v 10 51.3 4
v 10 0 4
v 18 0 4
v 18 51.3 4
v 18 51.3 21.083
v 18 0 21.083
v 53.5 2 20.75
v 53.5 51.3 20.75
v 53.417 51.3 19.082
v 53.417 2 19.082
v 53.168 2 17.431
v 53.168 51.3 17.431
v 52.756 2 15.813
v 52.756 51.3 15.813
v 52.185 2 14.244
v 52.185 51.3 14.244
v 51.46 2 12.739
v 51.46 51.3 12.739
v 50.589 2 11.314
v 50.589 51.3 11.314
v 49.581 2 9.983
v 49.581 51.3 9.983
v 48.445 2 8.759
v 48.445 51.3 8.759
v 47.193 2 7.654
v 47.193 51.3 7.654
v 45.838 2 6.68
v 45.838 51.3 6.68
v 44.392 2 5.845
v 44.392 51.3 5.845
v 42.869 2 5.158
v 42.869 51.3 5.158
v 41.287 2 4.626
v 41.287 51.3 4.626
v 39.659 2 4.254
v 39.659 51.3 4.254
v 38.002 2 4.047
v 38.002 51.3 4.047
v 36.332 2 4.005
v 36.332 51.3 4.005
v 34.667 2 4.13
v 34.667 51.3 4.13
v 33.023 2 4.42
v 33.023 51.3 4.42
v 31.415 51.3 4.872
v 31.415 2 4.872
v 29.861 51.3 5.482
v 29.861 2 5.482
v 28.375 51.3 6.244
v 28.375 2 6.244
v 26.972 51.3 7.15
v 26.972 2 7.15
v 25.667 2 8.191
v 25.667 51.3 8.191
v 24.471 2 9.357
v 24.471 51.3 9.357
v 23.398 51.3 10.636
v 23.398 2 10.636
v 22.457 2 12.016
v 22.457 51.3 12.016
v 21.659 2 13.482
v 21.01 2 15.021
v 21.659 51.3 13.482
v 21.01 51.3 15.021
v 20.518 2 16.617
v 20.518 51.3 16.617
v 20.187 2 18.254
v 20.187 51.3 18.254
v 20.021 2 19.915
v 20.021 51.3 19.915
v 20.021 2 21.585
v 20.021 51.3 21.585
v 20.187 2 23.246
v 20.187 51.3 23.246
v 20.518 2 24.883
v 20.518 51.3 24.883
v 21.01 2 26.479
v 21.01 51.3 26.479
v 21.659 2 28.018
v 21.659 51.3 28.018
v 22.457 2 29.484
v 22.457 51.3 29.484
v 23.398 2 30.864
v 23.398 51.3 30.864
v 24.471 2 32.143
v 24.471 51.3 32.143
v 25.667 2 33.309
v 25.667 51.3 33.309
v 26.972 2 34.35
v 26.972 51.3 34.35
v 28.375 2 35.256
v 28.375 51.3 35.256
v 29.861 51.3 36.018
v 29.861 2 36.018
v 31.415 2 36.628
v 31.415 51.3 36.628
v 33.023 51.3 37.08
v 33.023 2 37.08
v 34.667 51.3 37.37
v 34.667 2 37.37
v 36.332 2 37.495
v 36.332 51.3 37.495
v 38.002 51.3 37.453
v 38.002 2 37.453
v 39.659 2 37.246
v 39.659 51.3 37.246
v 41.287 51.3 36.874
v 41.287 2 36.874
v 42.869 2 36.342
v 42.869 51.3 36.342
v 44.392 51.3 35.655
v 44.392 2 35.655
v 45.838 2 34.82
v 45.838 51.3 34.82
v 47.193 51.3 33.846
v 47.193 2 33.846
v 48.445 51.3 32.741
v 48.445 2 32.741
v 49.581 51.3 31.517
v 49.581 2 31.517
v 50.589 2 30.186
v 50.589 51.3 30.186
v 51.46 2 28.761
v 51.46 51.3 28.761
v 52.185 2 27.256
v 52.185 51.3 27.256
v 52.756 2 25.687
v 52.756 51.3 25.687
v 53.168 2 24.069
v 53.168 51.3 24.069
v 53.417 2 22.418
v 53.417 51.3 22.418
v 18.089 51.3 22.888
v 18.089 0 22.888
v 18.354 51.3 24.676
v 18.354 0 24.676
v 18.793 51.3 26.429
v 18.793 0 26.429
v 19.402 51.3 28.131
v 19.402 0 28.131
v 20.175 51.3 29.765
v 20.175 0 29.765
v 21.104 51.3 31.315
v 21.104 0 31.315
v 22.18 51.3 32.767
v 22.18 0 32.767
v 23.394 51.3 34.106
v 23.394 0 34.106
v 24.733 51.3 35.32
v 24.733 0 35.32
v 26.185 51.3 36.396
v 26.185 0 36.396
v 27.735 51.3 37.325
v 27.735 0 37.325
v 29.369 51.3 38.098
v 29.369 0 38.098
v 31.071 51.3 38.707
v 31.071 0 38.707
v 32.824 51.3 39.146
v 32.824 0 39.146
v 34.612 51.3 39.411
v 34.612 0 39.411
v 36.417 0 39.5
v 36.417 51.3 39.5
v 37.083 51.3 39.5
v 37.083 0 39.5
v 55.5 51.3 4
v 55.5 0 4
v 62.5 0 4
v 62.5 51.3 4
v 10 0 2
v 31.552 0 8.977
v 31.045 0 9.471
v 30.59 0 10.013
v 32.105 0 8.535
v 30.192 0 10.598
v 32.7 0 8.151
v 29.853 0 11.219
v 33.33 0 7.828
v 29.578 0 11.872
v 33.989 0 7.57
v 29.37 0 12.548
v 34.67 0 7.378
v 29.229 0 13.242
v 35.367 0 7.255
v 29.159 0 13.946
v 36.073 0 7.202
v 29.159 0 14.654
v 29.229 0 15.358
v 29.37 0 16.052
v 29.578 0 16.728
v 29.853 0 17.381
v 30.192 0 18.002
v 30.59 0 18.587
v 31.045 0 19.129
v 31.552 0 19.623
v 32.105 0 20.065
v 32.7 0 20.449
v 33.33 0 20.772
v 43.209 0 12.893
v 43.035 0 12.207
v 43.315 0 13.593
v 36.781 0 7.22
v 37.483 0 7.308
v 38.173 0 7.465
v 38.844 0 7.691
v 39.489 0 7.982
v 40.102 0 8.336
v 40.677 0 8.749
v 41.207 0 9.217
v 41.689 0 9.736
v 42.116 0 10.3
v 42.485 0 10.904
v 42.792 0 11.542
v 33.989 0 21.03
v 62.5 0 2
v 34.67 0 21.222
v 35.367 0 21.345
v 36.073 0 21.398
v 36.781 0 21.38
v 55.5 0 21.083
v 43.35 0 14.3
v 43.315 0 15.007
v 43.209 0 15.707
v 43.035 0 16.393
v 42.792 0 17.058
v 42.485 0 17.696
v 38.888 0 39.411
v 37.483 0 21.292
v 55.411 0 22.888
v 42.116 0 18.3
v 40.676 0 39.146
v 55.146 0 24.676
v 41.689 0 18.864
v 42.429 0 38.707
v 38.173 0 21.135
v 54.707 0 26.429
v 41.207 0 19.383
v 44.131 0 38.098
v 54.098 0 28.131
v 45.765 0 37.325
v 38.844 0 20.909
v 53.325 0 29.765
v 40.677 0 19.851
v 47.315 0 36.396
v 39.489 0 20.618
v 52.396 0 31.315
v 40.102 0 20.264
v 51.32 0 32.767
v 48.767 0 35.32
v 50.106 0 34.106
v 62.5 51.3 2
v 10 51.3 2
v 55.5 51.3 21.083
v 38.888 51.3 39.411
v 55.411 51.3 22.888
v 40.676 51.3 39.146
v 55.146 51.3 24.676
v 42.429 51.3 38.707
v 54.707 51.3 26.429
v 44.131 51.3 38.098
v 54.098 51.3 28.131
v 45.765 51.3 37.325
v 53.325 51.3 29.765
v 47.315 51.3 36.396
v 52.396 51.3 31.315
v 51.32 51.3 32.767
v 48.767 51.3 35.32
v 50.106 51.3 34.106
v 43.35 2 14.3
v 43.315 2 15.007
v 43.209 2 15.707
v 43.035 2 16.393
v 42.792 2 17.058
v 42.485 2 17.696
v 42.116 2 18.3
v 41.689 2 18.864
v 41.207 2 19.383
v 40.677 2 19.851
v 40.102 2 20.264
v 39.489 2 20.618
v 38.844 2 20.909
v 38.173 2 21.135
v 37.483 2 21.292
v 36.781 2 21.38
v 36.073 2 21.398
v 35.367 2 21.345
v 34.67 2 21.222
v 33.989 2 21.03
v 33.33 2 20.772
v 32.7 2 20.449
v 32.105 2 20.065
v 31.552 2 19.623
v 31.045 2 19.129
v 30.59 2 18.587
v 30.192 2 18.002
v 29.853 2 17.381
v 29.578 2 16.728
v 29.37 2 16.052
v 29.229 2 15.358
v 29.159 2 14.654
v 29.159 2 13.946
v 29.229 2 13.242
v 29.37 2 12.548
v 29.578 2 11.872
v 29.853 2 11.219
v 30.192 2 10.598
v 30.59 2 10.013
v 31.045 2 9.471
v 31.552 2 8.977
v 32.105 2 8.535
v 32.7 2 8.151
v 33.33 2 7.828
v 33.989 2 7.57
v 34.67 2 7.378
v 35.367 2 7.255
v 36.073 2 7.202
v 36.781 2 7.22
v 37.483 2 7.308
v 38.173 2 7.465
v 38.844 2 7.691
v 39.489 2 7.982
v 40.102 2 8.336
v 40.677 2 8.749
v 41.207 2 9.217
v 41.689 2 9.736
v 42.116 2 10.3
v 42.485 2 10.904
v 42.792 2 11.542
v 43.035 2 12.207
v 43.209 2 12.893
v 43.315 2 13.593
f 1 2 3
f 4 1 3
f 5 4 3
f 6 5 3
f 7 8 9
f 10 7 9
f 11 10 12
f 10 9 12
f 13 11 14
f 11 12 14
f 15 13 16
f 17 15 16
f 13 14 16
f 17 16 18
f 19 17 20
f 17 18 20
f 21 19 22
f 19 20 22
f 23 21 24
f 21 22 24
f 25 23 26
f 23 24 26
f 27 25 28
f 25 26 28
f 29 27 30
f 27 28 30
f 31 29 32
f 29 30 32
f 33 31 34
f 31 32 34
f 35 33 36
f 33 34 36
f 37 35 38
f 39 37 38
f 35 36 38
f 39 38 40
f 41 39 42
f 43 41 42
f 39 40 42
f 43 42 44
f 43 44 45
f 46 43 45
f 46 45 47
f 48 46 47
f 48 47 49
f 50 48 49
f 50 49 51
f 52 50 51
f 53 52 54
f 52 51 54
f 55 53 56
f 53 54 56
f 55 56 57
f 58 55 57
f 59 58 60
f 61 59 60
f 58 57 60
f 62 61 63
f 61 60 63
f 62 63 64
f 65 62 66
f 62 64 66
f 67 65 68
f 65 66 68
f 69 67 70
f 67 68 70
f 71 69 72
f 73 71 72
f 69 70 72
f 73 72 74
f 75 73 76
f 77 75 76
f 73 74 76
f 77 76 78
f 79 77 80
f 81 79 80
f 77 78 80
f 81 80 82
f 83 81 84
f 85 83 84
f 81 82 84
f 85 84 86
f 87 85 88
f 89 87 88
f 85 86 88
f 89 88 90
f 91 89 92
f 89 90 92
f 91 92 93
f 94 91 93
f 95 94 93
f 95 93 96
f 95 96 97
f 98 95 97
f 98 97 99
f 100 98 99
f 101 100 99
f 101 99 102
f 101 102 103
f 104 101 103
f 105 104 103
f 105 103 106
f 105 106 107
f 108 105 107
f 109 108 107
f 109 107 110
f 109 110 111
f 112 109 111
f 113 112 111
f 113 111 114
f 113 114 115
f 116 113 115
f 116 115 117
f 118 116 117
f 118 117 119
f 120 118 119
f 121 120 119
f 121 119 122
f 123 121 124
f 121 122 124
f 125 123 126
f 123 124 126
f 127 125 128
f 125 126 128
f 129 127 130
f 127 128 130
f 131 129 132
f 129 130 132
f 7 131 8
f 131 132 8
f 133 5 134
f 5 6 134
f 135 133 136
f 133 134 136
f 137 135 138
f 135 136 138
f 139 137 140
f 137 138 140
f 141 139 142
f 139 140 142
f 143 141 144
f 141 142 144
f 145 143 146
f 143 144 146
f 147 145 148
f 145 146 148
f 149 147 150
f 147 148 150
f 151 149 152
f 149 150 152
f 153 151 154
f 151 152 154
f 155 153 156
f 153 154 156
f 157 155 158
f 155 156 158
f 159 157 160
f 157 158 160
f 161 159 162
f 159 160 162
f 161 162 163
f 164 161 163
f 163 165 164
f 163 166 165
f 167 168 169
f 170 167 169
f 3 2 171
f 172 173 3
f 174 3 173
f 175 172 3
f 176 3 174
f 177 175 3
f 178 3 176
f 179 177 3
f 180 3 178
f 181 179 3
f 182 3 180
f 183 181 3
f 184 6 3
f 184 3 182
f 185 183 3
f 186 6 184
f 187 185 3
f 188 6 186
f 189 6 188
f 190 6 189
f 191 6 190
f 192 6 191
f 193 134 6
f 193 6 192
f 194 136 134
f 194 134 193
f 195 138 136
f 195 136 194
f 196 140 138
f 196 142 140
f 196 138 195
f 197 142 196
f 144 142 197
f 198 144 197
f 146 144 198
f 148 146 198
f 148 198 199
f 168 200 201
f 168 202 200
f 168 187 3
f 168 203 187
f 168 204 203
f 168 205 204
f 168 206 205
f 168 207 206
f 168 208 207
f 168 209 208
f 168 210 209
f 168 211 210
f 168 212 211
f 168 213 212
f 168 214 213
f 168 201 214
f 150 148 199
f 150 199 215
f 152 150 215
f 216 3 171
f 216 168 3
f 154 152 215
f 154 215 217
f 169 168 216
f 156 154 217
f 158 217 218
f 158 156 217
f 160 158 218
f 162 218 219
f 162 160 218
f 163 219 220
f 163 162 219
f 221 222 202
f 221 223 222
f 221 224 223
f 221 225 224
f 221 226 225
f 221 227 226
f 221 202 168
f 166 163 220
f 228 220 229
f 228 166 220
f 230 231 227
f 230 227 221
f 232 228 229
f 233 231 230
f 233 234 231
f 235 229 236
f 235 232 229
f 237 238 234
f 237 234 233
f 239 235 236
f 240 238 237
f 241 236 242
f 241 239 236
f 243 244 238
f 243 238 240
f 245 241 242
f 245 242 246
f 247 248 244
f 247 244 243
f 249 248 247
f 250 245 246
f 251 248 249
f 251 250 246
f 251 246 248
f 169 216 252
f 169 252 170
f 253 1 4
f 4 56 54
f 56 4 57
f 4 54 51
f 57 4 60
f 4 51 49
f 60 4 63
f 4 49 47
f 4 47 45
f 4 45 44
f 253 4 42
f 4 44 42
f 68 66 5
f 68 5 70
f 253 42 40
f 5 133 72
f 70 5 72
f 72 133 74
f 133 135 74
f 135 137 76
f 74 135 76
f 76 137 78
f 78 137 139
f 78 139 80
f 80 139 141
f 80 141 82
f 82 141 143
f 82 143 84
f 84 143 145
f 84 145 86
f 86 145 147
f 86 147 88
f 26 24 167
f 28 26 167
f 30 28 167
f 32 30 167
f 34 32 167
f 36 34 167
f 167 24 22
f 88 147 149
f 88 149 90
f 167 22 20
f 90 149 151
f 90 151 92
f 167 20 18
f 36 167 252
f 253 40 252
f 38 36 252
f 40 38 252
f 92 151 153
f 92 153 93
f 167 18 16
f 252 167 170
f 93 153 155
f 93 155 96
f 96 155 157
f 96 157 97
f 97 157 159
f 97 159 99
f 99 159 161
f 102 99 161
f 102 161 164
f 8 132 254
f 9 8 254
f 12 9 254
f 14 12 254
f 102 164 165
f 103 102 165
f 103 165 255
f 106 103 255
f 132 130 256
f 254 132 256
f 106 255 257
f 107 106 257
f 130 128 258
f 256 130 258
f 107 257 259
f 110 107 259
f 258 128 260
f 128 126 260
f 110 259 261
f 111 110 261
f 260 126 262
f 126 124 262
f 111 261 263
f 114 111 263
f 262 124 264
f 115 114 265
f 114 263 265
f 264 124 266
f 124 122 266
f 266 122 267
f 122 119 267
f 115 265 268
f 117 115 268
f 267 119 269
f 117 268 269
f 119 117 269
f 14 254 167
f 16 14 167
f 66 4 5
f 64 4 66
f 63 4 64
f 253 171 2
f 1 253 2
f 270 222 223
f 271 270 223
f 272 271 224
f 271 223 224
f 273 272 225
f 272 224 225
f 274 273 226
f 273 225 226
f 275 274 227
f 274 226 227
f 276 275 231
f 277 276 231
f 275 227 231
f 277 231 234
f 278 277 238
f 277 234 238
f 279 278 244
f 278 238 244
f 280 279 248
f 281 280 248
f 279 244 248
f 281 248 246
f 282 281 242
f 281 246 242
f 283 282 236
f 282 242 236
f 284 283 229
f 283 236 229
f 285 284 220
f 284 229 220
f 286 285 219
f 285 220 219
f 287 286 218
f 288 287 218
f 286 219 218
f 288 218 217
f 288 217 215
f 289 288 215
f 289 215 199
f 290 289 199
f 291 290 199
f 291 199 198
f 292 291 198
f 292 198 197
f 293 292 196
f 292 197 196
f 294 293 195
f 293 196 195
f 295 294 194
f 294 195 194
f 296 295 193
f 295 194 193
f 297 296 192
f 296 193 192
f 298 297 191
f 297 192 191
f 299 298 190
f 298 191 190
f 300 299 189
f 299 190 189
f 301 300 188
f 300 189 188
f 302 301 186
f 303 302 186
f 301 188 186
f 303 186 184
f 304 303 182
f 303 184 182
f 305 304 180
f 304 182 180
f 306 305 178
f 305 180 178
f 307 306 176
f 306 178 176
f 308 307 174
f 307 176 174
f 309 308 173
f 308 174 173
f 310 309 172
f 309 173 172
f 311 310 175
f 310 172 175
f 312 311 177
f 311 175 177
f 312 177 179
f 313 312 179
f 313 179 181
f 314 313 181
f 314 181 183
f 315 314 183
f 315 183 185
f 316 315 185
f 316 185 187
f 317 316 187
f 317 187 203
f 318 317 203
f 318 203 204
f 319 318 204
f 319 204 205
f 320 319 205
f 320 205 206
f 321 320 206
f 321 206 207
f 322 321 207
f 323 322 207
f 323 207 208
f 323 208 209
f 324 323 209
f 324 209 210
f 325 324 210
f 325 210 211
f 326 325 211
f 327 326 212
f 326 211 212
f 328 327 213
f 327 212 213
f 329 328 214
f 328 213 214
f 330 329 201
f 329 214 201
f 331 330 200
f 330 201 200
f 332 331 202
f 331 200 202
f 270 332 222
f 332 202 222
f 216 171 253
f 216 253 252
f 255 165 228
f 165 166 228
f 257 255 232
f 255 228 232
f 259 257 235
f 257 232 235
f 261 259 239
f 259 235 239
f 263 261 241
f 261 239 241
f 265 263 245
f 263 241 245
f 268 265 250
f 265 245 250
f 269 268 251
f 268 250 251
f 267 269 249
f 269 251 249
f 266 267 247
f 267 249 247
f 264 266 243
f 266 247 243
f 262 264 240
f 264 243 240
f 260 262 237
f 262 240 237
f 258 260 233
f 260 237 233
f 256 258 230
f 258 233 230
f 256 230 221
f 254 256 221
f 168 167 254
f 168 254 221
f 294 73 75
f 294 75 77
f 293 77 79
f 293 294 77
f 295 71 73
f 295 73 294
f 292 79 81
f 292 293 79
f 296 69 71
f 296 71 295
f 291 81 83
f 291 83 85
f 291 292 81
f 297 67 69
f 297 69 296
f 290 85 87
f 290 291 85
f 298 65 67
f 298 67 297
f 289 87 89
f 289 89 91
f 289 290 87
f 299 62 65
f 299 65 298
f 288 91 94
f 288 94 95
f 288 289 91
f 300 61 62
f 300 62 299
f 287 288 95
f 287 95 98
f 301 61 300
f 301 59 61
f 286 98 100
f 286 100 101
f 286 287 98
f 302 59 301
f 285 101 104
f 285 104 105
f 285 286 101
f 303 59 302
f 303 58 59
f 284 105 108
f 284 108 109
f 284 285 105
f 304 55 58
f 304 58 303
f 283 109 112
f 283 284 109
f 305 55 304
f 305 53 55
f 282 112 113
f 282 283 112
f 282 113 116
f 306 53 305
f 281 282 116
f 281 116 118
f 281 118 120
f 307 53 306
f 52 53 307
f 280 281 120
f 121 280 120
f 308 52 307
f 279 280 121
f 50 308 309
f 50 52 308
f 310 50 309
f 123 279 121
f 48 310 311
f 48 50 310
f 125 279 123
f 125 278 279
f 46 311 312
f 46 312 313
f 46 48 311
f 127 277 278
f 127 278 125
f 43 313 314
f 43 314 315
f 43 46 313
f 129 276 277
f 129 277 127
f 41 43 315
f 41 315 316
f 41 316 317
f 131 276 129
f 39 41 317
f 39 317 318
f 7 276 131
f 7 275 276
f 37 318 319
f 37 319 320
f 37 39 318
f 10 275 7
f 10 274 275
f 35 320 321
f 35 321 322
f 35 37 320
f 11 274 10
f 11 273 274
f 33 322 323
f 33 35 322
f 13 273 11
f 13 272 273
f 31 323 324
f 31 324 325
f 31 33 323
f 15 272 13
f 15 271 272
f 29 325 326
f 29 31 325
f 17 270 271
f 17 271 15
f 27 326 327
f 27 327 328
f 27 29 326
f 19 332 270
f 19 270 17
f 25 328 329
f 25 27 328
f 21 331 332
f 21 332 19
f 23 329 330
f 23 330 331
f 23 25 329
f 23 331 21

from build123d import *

# Parameters (mm, degrees)
SKETCH018_W     = 52.5
SKETCH018_H     = 2
PAD014_DEPTH    = 51.3
SKETCH028_W     = 37.5
SKETCH028_H     = 51.3
PAD015_DEPTH    = 35.5
FILLET001_R     = 18.416667
SKETCH031_R     = 7.1
POCKET005_DEPTH = 2
SKETCH032_R     = 16.75
POCKET006_DEPTH = 49.3


with BuildPart() as part:
    # Sketch018 → Pad014 (new body)
    with BuildSketch(Plane.XZ):
        with Locations((36.25, 3)):
            Rectangle(SKETCH018_W, SKETCH018_H)
    extrude(amount=-PAD014_DEPTH)

    # Sketch028 (on Face1 of Pad014) → Pad015 (join)
    with BuildSketch(Plane(origin=(0, 0, 4), x_dir=(-1, 0, 0), z_dir=(0, 0, 1))):
        with Locations((-36.75, -25.65)):
            Rectangle(SKETCH028_W, SKETCH028_H)
    extrude(amount=PAD015_DEPTH)

    # Fillet001
    fillet001_edges = [part.edges().sort_by_distance(p)[0] for p in [
        (18, 25.65, 39.5),
        (55.5, 25.65, 39.5),
    ]]
    fillet(fillet001_edges, radius=FILLET001_R)

    # Sketch031 (on Face6 of Pad015) → Pocket005 (cut)
    with BuildSketch(Plane.XZ):
        with Locations((36.25, 14.3)):
            Circle(SKETCH031_R)
    extrude(amount=-POCKET005_DEPTH, mode=Mode.SUBTRACT)

    # Sketch032 (on Face5 of Pocket005) → Pocket006 (cut)
    with BuildSketch(Plane(origin=(0, 51.3, 0), x_dir=(1, 0, 0), z_dir=(0, 1, 0))):
        with Locations((36.75, -20.75)):
            Circle(SKETCH032_R)
    extrude(amount=-POCKET006_DEPTH, mode=Mode.SUBTRACT)


solid = part.part
